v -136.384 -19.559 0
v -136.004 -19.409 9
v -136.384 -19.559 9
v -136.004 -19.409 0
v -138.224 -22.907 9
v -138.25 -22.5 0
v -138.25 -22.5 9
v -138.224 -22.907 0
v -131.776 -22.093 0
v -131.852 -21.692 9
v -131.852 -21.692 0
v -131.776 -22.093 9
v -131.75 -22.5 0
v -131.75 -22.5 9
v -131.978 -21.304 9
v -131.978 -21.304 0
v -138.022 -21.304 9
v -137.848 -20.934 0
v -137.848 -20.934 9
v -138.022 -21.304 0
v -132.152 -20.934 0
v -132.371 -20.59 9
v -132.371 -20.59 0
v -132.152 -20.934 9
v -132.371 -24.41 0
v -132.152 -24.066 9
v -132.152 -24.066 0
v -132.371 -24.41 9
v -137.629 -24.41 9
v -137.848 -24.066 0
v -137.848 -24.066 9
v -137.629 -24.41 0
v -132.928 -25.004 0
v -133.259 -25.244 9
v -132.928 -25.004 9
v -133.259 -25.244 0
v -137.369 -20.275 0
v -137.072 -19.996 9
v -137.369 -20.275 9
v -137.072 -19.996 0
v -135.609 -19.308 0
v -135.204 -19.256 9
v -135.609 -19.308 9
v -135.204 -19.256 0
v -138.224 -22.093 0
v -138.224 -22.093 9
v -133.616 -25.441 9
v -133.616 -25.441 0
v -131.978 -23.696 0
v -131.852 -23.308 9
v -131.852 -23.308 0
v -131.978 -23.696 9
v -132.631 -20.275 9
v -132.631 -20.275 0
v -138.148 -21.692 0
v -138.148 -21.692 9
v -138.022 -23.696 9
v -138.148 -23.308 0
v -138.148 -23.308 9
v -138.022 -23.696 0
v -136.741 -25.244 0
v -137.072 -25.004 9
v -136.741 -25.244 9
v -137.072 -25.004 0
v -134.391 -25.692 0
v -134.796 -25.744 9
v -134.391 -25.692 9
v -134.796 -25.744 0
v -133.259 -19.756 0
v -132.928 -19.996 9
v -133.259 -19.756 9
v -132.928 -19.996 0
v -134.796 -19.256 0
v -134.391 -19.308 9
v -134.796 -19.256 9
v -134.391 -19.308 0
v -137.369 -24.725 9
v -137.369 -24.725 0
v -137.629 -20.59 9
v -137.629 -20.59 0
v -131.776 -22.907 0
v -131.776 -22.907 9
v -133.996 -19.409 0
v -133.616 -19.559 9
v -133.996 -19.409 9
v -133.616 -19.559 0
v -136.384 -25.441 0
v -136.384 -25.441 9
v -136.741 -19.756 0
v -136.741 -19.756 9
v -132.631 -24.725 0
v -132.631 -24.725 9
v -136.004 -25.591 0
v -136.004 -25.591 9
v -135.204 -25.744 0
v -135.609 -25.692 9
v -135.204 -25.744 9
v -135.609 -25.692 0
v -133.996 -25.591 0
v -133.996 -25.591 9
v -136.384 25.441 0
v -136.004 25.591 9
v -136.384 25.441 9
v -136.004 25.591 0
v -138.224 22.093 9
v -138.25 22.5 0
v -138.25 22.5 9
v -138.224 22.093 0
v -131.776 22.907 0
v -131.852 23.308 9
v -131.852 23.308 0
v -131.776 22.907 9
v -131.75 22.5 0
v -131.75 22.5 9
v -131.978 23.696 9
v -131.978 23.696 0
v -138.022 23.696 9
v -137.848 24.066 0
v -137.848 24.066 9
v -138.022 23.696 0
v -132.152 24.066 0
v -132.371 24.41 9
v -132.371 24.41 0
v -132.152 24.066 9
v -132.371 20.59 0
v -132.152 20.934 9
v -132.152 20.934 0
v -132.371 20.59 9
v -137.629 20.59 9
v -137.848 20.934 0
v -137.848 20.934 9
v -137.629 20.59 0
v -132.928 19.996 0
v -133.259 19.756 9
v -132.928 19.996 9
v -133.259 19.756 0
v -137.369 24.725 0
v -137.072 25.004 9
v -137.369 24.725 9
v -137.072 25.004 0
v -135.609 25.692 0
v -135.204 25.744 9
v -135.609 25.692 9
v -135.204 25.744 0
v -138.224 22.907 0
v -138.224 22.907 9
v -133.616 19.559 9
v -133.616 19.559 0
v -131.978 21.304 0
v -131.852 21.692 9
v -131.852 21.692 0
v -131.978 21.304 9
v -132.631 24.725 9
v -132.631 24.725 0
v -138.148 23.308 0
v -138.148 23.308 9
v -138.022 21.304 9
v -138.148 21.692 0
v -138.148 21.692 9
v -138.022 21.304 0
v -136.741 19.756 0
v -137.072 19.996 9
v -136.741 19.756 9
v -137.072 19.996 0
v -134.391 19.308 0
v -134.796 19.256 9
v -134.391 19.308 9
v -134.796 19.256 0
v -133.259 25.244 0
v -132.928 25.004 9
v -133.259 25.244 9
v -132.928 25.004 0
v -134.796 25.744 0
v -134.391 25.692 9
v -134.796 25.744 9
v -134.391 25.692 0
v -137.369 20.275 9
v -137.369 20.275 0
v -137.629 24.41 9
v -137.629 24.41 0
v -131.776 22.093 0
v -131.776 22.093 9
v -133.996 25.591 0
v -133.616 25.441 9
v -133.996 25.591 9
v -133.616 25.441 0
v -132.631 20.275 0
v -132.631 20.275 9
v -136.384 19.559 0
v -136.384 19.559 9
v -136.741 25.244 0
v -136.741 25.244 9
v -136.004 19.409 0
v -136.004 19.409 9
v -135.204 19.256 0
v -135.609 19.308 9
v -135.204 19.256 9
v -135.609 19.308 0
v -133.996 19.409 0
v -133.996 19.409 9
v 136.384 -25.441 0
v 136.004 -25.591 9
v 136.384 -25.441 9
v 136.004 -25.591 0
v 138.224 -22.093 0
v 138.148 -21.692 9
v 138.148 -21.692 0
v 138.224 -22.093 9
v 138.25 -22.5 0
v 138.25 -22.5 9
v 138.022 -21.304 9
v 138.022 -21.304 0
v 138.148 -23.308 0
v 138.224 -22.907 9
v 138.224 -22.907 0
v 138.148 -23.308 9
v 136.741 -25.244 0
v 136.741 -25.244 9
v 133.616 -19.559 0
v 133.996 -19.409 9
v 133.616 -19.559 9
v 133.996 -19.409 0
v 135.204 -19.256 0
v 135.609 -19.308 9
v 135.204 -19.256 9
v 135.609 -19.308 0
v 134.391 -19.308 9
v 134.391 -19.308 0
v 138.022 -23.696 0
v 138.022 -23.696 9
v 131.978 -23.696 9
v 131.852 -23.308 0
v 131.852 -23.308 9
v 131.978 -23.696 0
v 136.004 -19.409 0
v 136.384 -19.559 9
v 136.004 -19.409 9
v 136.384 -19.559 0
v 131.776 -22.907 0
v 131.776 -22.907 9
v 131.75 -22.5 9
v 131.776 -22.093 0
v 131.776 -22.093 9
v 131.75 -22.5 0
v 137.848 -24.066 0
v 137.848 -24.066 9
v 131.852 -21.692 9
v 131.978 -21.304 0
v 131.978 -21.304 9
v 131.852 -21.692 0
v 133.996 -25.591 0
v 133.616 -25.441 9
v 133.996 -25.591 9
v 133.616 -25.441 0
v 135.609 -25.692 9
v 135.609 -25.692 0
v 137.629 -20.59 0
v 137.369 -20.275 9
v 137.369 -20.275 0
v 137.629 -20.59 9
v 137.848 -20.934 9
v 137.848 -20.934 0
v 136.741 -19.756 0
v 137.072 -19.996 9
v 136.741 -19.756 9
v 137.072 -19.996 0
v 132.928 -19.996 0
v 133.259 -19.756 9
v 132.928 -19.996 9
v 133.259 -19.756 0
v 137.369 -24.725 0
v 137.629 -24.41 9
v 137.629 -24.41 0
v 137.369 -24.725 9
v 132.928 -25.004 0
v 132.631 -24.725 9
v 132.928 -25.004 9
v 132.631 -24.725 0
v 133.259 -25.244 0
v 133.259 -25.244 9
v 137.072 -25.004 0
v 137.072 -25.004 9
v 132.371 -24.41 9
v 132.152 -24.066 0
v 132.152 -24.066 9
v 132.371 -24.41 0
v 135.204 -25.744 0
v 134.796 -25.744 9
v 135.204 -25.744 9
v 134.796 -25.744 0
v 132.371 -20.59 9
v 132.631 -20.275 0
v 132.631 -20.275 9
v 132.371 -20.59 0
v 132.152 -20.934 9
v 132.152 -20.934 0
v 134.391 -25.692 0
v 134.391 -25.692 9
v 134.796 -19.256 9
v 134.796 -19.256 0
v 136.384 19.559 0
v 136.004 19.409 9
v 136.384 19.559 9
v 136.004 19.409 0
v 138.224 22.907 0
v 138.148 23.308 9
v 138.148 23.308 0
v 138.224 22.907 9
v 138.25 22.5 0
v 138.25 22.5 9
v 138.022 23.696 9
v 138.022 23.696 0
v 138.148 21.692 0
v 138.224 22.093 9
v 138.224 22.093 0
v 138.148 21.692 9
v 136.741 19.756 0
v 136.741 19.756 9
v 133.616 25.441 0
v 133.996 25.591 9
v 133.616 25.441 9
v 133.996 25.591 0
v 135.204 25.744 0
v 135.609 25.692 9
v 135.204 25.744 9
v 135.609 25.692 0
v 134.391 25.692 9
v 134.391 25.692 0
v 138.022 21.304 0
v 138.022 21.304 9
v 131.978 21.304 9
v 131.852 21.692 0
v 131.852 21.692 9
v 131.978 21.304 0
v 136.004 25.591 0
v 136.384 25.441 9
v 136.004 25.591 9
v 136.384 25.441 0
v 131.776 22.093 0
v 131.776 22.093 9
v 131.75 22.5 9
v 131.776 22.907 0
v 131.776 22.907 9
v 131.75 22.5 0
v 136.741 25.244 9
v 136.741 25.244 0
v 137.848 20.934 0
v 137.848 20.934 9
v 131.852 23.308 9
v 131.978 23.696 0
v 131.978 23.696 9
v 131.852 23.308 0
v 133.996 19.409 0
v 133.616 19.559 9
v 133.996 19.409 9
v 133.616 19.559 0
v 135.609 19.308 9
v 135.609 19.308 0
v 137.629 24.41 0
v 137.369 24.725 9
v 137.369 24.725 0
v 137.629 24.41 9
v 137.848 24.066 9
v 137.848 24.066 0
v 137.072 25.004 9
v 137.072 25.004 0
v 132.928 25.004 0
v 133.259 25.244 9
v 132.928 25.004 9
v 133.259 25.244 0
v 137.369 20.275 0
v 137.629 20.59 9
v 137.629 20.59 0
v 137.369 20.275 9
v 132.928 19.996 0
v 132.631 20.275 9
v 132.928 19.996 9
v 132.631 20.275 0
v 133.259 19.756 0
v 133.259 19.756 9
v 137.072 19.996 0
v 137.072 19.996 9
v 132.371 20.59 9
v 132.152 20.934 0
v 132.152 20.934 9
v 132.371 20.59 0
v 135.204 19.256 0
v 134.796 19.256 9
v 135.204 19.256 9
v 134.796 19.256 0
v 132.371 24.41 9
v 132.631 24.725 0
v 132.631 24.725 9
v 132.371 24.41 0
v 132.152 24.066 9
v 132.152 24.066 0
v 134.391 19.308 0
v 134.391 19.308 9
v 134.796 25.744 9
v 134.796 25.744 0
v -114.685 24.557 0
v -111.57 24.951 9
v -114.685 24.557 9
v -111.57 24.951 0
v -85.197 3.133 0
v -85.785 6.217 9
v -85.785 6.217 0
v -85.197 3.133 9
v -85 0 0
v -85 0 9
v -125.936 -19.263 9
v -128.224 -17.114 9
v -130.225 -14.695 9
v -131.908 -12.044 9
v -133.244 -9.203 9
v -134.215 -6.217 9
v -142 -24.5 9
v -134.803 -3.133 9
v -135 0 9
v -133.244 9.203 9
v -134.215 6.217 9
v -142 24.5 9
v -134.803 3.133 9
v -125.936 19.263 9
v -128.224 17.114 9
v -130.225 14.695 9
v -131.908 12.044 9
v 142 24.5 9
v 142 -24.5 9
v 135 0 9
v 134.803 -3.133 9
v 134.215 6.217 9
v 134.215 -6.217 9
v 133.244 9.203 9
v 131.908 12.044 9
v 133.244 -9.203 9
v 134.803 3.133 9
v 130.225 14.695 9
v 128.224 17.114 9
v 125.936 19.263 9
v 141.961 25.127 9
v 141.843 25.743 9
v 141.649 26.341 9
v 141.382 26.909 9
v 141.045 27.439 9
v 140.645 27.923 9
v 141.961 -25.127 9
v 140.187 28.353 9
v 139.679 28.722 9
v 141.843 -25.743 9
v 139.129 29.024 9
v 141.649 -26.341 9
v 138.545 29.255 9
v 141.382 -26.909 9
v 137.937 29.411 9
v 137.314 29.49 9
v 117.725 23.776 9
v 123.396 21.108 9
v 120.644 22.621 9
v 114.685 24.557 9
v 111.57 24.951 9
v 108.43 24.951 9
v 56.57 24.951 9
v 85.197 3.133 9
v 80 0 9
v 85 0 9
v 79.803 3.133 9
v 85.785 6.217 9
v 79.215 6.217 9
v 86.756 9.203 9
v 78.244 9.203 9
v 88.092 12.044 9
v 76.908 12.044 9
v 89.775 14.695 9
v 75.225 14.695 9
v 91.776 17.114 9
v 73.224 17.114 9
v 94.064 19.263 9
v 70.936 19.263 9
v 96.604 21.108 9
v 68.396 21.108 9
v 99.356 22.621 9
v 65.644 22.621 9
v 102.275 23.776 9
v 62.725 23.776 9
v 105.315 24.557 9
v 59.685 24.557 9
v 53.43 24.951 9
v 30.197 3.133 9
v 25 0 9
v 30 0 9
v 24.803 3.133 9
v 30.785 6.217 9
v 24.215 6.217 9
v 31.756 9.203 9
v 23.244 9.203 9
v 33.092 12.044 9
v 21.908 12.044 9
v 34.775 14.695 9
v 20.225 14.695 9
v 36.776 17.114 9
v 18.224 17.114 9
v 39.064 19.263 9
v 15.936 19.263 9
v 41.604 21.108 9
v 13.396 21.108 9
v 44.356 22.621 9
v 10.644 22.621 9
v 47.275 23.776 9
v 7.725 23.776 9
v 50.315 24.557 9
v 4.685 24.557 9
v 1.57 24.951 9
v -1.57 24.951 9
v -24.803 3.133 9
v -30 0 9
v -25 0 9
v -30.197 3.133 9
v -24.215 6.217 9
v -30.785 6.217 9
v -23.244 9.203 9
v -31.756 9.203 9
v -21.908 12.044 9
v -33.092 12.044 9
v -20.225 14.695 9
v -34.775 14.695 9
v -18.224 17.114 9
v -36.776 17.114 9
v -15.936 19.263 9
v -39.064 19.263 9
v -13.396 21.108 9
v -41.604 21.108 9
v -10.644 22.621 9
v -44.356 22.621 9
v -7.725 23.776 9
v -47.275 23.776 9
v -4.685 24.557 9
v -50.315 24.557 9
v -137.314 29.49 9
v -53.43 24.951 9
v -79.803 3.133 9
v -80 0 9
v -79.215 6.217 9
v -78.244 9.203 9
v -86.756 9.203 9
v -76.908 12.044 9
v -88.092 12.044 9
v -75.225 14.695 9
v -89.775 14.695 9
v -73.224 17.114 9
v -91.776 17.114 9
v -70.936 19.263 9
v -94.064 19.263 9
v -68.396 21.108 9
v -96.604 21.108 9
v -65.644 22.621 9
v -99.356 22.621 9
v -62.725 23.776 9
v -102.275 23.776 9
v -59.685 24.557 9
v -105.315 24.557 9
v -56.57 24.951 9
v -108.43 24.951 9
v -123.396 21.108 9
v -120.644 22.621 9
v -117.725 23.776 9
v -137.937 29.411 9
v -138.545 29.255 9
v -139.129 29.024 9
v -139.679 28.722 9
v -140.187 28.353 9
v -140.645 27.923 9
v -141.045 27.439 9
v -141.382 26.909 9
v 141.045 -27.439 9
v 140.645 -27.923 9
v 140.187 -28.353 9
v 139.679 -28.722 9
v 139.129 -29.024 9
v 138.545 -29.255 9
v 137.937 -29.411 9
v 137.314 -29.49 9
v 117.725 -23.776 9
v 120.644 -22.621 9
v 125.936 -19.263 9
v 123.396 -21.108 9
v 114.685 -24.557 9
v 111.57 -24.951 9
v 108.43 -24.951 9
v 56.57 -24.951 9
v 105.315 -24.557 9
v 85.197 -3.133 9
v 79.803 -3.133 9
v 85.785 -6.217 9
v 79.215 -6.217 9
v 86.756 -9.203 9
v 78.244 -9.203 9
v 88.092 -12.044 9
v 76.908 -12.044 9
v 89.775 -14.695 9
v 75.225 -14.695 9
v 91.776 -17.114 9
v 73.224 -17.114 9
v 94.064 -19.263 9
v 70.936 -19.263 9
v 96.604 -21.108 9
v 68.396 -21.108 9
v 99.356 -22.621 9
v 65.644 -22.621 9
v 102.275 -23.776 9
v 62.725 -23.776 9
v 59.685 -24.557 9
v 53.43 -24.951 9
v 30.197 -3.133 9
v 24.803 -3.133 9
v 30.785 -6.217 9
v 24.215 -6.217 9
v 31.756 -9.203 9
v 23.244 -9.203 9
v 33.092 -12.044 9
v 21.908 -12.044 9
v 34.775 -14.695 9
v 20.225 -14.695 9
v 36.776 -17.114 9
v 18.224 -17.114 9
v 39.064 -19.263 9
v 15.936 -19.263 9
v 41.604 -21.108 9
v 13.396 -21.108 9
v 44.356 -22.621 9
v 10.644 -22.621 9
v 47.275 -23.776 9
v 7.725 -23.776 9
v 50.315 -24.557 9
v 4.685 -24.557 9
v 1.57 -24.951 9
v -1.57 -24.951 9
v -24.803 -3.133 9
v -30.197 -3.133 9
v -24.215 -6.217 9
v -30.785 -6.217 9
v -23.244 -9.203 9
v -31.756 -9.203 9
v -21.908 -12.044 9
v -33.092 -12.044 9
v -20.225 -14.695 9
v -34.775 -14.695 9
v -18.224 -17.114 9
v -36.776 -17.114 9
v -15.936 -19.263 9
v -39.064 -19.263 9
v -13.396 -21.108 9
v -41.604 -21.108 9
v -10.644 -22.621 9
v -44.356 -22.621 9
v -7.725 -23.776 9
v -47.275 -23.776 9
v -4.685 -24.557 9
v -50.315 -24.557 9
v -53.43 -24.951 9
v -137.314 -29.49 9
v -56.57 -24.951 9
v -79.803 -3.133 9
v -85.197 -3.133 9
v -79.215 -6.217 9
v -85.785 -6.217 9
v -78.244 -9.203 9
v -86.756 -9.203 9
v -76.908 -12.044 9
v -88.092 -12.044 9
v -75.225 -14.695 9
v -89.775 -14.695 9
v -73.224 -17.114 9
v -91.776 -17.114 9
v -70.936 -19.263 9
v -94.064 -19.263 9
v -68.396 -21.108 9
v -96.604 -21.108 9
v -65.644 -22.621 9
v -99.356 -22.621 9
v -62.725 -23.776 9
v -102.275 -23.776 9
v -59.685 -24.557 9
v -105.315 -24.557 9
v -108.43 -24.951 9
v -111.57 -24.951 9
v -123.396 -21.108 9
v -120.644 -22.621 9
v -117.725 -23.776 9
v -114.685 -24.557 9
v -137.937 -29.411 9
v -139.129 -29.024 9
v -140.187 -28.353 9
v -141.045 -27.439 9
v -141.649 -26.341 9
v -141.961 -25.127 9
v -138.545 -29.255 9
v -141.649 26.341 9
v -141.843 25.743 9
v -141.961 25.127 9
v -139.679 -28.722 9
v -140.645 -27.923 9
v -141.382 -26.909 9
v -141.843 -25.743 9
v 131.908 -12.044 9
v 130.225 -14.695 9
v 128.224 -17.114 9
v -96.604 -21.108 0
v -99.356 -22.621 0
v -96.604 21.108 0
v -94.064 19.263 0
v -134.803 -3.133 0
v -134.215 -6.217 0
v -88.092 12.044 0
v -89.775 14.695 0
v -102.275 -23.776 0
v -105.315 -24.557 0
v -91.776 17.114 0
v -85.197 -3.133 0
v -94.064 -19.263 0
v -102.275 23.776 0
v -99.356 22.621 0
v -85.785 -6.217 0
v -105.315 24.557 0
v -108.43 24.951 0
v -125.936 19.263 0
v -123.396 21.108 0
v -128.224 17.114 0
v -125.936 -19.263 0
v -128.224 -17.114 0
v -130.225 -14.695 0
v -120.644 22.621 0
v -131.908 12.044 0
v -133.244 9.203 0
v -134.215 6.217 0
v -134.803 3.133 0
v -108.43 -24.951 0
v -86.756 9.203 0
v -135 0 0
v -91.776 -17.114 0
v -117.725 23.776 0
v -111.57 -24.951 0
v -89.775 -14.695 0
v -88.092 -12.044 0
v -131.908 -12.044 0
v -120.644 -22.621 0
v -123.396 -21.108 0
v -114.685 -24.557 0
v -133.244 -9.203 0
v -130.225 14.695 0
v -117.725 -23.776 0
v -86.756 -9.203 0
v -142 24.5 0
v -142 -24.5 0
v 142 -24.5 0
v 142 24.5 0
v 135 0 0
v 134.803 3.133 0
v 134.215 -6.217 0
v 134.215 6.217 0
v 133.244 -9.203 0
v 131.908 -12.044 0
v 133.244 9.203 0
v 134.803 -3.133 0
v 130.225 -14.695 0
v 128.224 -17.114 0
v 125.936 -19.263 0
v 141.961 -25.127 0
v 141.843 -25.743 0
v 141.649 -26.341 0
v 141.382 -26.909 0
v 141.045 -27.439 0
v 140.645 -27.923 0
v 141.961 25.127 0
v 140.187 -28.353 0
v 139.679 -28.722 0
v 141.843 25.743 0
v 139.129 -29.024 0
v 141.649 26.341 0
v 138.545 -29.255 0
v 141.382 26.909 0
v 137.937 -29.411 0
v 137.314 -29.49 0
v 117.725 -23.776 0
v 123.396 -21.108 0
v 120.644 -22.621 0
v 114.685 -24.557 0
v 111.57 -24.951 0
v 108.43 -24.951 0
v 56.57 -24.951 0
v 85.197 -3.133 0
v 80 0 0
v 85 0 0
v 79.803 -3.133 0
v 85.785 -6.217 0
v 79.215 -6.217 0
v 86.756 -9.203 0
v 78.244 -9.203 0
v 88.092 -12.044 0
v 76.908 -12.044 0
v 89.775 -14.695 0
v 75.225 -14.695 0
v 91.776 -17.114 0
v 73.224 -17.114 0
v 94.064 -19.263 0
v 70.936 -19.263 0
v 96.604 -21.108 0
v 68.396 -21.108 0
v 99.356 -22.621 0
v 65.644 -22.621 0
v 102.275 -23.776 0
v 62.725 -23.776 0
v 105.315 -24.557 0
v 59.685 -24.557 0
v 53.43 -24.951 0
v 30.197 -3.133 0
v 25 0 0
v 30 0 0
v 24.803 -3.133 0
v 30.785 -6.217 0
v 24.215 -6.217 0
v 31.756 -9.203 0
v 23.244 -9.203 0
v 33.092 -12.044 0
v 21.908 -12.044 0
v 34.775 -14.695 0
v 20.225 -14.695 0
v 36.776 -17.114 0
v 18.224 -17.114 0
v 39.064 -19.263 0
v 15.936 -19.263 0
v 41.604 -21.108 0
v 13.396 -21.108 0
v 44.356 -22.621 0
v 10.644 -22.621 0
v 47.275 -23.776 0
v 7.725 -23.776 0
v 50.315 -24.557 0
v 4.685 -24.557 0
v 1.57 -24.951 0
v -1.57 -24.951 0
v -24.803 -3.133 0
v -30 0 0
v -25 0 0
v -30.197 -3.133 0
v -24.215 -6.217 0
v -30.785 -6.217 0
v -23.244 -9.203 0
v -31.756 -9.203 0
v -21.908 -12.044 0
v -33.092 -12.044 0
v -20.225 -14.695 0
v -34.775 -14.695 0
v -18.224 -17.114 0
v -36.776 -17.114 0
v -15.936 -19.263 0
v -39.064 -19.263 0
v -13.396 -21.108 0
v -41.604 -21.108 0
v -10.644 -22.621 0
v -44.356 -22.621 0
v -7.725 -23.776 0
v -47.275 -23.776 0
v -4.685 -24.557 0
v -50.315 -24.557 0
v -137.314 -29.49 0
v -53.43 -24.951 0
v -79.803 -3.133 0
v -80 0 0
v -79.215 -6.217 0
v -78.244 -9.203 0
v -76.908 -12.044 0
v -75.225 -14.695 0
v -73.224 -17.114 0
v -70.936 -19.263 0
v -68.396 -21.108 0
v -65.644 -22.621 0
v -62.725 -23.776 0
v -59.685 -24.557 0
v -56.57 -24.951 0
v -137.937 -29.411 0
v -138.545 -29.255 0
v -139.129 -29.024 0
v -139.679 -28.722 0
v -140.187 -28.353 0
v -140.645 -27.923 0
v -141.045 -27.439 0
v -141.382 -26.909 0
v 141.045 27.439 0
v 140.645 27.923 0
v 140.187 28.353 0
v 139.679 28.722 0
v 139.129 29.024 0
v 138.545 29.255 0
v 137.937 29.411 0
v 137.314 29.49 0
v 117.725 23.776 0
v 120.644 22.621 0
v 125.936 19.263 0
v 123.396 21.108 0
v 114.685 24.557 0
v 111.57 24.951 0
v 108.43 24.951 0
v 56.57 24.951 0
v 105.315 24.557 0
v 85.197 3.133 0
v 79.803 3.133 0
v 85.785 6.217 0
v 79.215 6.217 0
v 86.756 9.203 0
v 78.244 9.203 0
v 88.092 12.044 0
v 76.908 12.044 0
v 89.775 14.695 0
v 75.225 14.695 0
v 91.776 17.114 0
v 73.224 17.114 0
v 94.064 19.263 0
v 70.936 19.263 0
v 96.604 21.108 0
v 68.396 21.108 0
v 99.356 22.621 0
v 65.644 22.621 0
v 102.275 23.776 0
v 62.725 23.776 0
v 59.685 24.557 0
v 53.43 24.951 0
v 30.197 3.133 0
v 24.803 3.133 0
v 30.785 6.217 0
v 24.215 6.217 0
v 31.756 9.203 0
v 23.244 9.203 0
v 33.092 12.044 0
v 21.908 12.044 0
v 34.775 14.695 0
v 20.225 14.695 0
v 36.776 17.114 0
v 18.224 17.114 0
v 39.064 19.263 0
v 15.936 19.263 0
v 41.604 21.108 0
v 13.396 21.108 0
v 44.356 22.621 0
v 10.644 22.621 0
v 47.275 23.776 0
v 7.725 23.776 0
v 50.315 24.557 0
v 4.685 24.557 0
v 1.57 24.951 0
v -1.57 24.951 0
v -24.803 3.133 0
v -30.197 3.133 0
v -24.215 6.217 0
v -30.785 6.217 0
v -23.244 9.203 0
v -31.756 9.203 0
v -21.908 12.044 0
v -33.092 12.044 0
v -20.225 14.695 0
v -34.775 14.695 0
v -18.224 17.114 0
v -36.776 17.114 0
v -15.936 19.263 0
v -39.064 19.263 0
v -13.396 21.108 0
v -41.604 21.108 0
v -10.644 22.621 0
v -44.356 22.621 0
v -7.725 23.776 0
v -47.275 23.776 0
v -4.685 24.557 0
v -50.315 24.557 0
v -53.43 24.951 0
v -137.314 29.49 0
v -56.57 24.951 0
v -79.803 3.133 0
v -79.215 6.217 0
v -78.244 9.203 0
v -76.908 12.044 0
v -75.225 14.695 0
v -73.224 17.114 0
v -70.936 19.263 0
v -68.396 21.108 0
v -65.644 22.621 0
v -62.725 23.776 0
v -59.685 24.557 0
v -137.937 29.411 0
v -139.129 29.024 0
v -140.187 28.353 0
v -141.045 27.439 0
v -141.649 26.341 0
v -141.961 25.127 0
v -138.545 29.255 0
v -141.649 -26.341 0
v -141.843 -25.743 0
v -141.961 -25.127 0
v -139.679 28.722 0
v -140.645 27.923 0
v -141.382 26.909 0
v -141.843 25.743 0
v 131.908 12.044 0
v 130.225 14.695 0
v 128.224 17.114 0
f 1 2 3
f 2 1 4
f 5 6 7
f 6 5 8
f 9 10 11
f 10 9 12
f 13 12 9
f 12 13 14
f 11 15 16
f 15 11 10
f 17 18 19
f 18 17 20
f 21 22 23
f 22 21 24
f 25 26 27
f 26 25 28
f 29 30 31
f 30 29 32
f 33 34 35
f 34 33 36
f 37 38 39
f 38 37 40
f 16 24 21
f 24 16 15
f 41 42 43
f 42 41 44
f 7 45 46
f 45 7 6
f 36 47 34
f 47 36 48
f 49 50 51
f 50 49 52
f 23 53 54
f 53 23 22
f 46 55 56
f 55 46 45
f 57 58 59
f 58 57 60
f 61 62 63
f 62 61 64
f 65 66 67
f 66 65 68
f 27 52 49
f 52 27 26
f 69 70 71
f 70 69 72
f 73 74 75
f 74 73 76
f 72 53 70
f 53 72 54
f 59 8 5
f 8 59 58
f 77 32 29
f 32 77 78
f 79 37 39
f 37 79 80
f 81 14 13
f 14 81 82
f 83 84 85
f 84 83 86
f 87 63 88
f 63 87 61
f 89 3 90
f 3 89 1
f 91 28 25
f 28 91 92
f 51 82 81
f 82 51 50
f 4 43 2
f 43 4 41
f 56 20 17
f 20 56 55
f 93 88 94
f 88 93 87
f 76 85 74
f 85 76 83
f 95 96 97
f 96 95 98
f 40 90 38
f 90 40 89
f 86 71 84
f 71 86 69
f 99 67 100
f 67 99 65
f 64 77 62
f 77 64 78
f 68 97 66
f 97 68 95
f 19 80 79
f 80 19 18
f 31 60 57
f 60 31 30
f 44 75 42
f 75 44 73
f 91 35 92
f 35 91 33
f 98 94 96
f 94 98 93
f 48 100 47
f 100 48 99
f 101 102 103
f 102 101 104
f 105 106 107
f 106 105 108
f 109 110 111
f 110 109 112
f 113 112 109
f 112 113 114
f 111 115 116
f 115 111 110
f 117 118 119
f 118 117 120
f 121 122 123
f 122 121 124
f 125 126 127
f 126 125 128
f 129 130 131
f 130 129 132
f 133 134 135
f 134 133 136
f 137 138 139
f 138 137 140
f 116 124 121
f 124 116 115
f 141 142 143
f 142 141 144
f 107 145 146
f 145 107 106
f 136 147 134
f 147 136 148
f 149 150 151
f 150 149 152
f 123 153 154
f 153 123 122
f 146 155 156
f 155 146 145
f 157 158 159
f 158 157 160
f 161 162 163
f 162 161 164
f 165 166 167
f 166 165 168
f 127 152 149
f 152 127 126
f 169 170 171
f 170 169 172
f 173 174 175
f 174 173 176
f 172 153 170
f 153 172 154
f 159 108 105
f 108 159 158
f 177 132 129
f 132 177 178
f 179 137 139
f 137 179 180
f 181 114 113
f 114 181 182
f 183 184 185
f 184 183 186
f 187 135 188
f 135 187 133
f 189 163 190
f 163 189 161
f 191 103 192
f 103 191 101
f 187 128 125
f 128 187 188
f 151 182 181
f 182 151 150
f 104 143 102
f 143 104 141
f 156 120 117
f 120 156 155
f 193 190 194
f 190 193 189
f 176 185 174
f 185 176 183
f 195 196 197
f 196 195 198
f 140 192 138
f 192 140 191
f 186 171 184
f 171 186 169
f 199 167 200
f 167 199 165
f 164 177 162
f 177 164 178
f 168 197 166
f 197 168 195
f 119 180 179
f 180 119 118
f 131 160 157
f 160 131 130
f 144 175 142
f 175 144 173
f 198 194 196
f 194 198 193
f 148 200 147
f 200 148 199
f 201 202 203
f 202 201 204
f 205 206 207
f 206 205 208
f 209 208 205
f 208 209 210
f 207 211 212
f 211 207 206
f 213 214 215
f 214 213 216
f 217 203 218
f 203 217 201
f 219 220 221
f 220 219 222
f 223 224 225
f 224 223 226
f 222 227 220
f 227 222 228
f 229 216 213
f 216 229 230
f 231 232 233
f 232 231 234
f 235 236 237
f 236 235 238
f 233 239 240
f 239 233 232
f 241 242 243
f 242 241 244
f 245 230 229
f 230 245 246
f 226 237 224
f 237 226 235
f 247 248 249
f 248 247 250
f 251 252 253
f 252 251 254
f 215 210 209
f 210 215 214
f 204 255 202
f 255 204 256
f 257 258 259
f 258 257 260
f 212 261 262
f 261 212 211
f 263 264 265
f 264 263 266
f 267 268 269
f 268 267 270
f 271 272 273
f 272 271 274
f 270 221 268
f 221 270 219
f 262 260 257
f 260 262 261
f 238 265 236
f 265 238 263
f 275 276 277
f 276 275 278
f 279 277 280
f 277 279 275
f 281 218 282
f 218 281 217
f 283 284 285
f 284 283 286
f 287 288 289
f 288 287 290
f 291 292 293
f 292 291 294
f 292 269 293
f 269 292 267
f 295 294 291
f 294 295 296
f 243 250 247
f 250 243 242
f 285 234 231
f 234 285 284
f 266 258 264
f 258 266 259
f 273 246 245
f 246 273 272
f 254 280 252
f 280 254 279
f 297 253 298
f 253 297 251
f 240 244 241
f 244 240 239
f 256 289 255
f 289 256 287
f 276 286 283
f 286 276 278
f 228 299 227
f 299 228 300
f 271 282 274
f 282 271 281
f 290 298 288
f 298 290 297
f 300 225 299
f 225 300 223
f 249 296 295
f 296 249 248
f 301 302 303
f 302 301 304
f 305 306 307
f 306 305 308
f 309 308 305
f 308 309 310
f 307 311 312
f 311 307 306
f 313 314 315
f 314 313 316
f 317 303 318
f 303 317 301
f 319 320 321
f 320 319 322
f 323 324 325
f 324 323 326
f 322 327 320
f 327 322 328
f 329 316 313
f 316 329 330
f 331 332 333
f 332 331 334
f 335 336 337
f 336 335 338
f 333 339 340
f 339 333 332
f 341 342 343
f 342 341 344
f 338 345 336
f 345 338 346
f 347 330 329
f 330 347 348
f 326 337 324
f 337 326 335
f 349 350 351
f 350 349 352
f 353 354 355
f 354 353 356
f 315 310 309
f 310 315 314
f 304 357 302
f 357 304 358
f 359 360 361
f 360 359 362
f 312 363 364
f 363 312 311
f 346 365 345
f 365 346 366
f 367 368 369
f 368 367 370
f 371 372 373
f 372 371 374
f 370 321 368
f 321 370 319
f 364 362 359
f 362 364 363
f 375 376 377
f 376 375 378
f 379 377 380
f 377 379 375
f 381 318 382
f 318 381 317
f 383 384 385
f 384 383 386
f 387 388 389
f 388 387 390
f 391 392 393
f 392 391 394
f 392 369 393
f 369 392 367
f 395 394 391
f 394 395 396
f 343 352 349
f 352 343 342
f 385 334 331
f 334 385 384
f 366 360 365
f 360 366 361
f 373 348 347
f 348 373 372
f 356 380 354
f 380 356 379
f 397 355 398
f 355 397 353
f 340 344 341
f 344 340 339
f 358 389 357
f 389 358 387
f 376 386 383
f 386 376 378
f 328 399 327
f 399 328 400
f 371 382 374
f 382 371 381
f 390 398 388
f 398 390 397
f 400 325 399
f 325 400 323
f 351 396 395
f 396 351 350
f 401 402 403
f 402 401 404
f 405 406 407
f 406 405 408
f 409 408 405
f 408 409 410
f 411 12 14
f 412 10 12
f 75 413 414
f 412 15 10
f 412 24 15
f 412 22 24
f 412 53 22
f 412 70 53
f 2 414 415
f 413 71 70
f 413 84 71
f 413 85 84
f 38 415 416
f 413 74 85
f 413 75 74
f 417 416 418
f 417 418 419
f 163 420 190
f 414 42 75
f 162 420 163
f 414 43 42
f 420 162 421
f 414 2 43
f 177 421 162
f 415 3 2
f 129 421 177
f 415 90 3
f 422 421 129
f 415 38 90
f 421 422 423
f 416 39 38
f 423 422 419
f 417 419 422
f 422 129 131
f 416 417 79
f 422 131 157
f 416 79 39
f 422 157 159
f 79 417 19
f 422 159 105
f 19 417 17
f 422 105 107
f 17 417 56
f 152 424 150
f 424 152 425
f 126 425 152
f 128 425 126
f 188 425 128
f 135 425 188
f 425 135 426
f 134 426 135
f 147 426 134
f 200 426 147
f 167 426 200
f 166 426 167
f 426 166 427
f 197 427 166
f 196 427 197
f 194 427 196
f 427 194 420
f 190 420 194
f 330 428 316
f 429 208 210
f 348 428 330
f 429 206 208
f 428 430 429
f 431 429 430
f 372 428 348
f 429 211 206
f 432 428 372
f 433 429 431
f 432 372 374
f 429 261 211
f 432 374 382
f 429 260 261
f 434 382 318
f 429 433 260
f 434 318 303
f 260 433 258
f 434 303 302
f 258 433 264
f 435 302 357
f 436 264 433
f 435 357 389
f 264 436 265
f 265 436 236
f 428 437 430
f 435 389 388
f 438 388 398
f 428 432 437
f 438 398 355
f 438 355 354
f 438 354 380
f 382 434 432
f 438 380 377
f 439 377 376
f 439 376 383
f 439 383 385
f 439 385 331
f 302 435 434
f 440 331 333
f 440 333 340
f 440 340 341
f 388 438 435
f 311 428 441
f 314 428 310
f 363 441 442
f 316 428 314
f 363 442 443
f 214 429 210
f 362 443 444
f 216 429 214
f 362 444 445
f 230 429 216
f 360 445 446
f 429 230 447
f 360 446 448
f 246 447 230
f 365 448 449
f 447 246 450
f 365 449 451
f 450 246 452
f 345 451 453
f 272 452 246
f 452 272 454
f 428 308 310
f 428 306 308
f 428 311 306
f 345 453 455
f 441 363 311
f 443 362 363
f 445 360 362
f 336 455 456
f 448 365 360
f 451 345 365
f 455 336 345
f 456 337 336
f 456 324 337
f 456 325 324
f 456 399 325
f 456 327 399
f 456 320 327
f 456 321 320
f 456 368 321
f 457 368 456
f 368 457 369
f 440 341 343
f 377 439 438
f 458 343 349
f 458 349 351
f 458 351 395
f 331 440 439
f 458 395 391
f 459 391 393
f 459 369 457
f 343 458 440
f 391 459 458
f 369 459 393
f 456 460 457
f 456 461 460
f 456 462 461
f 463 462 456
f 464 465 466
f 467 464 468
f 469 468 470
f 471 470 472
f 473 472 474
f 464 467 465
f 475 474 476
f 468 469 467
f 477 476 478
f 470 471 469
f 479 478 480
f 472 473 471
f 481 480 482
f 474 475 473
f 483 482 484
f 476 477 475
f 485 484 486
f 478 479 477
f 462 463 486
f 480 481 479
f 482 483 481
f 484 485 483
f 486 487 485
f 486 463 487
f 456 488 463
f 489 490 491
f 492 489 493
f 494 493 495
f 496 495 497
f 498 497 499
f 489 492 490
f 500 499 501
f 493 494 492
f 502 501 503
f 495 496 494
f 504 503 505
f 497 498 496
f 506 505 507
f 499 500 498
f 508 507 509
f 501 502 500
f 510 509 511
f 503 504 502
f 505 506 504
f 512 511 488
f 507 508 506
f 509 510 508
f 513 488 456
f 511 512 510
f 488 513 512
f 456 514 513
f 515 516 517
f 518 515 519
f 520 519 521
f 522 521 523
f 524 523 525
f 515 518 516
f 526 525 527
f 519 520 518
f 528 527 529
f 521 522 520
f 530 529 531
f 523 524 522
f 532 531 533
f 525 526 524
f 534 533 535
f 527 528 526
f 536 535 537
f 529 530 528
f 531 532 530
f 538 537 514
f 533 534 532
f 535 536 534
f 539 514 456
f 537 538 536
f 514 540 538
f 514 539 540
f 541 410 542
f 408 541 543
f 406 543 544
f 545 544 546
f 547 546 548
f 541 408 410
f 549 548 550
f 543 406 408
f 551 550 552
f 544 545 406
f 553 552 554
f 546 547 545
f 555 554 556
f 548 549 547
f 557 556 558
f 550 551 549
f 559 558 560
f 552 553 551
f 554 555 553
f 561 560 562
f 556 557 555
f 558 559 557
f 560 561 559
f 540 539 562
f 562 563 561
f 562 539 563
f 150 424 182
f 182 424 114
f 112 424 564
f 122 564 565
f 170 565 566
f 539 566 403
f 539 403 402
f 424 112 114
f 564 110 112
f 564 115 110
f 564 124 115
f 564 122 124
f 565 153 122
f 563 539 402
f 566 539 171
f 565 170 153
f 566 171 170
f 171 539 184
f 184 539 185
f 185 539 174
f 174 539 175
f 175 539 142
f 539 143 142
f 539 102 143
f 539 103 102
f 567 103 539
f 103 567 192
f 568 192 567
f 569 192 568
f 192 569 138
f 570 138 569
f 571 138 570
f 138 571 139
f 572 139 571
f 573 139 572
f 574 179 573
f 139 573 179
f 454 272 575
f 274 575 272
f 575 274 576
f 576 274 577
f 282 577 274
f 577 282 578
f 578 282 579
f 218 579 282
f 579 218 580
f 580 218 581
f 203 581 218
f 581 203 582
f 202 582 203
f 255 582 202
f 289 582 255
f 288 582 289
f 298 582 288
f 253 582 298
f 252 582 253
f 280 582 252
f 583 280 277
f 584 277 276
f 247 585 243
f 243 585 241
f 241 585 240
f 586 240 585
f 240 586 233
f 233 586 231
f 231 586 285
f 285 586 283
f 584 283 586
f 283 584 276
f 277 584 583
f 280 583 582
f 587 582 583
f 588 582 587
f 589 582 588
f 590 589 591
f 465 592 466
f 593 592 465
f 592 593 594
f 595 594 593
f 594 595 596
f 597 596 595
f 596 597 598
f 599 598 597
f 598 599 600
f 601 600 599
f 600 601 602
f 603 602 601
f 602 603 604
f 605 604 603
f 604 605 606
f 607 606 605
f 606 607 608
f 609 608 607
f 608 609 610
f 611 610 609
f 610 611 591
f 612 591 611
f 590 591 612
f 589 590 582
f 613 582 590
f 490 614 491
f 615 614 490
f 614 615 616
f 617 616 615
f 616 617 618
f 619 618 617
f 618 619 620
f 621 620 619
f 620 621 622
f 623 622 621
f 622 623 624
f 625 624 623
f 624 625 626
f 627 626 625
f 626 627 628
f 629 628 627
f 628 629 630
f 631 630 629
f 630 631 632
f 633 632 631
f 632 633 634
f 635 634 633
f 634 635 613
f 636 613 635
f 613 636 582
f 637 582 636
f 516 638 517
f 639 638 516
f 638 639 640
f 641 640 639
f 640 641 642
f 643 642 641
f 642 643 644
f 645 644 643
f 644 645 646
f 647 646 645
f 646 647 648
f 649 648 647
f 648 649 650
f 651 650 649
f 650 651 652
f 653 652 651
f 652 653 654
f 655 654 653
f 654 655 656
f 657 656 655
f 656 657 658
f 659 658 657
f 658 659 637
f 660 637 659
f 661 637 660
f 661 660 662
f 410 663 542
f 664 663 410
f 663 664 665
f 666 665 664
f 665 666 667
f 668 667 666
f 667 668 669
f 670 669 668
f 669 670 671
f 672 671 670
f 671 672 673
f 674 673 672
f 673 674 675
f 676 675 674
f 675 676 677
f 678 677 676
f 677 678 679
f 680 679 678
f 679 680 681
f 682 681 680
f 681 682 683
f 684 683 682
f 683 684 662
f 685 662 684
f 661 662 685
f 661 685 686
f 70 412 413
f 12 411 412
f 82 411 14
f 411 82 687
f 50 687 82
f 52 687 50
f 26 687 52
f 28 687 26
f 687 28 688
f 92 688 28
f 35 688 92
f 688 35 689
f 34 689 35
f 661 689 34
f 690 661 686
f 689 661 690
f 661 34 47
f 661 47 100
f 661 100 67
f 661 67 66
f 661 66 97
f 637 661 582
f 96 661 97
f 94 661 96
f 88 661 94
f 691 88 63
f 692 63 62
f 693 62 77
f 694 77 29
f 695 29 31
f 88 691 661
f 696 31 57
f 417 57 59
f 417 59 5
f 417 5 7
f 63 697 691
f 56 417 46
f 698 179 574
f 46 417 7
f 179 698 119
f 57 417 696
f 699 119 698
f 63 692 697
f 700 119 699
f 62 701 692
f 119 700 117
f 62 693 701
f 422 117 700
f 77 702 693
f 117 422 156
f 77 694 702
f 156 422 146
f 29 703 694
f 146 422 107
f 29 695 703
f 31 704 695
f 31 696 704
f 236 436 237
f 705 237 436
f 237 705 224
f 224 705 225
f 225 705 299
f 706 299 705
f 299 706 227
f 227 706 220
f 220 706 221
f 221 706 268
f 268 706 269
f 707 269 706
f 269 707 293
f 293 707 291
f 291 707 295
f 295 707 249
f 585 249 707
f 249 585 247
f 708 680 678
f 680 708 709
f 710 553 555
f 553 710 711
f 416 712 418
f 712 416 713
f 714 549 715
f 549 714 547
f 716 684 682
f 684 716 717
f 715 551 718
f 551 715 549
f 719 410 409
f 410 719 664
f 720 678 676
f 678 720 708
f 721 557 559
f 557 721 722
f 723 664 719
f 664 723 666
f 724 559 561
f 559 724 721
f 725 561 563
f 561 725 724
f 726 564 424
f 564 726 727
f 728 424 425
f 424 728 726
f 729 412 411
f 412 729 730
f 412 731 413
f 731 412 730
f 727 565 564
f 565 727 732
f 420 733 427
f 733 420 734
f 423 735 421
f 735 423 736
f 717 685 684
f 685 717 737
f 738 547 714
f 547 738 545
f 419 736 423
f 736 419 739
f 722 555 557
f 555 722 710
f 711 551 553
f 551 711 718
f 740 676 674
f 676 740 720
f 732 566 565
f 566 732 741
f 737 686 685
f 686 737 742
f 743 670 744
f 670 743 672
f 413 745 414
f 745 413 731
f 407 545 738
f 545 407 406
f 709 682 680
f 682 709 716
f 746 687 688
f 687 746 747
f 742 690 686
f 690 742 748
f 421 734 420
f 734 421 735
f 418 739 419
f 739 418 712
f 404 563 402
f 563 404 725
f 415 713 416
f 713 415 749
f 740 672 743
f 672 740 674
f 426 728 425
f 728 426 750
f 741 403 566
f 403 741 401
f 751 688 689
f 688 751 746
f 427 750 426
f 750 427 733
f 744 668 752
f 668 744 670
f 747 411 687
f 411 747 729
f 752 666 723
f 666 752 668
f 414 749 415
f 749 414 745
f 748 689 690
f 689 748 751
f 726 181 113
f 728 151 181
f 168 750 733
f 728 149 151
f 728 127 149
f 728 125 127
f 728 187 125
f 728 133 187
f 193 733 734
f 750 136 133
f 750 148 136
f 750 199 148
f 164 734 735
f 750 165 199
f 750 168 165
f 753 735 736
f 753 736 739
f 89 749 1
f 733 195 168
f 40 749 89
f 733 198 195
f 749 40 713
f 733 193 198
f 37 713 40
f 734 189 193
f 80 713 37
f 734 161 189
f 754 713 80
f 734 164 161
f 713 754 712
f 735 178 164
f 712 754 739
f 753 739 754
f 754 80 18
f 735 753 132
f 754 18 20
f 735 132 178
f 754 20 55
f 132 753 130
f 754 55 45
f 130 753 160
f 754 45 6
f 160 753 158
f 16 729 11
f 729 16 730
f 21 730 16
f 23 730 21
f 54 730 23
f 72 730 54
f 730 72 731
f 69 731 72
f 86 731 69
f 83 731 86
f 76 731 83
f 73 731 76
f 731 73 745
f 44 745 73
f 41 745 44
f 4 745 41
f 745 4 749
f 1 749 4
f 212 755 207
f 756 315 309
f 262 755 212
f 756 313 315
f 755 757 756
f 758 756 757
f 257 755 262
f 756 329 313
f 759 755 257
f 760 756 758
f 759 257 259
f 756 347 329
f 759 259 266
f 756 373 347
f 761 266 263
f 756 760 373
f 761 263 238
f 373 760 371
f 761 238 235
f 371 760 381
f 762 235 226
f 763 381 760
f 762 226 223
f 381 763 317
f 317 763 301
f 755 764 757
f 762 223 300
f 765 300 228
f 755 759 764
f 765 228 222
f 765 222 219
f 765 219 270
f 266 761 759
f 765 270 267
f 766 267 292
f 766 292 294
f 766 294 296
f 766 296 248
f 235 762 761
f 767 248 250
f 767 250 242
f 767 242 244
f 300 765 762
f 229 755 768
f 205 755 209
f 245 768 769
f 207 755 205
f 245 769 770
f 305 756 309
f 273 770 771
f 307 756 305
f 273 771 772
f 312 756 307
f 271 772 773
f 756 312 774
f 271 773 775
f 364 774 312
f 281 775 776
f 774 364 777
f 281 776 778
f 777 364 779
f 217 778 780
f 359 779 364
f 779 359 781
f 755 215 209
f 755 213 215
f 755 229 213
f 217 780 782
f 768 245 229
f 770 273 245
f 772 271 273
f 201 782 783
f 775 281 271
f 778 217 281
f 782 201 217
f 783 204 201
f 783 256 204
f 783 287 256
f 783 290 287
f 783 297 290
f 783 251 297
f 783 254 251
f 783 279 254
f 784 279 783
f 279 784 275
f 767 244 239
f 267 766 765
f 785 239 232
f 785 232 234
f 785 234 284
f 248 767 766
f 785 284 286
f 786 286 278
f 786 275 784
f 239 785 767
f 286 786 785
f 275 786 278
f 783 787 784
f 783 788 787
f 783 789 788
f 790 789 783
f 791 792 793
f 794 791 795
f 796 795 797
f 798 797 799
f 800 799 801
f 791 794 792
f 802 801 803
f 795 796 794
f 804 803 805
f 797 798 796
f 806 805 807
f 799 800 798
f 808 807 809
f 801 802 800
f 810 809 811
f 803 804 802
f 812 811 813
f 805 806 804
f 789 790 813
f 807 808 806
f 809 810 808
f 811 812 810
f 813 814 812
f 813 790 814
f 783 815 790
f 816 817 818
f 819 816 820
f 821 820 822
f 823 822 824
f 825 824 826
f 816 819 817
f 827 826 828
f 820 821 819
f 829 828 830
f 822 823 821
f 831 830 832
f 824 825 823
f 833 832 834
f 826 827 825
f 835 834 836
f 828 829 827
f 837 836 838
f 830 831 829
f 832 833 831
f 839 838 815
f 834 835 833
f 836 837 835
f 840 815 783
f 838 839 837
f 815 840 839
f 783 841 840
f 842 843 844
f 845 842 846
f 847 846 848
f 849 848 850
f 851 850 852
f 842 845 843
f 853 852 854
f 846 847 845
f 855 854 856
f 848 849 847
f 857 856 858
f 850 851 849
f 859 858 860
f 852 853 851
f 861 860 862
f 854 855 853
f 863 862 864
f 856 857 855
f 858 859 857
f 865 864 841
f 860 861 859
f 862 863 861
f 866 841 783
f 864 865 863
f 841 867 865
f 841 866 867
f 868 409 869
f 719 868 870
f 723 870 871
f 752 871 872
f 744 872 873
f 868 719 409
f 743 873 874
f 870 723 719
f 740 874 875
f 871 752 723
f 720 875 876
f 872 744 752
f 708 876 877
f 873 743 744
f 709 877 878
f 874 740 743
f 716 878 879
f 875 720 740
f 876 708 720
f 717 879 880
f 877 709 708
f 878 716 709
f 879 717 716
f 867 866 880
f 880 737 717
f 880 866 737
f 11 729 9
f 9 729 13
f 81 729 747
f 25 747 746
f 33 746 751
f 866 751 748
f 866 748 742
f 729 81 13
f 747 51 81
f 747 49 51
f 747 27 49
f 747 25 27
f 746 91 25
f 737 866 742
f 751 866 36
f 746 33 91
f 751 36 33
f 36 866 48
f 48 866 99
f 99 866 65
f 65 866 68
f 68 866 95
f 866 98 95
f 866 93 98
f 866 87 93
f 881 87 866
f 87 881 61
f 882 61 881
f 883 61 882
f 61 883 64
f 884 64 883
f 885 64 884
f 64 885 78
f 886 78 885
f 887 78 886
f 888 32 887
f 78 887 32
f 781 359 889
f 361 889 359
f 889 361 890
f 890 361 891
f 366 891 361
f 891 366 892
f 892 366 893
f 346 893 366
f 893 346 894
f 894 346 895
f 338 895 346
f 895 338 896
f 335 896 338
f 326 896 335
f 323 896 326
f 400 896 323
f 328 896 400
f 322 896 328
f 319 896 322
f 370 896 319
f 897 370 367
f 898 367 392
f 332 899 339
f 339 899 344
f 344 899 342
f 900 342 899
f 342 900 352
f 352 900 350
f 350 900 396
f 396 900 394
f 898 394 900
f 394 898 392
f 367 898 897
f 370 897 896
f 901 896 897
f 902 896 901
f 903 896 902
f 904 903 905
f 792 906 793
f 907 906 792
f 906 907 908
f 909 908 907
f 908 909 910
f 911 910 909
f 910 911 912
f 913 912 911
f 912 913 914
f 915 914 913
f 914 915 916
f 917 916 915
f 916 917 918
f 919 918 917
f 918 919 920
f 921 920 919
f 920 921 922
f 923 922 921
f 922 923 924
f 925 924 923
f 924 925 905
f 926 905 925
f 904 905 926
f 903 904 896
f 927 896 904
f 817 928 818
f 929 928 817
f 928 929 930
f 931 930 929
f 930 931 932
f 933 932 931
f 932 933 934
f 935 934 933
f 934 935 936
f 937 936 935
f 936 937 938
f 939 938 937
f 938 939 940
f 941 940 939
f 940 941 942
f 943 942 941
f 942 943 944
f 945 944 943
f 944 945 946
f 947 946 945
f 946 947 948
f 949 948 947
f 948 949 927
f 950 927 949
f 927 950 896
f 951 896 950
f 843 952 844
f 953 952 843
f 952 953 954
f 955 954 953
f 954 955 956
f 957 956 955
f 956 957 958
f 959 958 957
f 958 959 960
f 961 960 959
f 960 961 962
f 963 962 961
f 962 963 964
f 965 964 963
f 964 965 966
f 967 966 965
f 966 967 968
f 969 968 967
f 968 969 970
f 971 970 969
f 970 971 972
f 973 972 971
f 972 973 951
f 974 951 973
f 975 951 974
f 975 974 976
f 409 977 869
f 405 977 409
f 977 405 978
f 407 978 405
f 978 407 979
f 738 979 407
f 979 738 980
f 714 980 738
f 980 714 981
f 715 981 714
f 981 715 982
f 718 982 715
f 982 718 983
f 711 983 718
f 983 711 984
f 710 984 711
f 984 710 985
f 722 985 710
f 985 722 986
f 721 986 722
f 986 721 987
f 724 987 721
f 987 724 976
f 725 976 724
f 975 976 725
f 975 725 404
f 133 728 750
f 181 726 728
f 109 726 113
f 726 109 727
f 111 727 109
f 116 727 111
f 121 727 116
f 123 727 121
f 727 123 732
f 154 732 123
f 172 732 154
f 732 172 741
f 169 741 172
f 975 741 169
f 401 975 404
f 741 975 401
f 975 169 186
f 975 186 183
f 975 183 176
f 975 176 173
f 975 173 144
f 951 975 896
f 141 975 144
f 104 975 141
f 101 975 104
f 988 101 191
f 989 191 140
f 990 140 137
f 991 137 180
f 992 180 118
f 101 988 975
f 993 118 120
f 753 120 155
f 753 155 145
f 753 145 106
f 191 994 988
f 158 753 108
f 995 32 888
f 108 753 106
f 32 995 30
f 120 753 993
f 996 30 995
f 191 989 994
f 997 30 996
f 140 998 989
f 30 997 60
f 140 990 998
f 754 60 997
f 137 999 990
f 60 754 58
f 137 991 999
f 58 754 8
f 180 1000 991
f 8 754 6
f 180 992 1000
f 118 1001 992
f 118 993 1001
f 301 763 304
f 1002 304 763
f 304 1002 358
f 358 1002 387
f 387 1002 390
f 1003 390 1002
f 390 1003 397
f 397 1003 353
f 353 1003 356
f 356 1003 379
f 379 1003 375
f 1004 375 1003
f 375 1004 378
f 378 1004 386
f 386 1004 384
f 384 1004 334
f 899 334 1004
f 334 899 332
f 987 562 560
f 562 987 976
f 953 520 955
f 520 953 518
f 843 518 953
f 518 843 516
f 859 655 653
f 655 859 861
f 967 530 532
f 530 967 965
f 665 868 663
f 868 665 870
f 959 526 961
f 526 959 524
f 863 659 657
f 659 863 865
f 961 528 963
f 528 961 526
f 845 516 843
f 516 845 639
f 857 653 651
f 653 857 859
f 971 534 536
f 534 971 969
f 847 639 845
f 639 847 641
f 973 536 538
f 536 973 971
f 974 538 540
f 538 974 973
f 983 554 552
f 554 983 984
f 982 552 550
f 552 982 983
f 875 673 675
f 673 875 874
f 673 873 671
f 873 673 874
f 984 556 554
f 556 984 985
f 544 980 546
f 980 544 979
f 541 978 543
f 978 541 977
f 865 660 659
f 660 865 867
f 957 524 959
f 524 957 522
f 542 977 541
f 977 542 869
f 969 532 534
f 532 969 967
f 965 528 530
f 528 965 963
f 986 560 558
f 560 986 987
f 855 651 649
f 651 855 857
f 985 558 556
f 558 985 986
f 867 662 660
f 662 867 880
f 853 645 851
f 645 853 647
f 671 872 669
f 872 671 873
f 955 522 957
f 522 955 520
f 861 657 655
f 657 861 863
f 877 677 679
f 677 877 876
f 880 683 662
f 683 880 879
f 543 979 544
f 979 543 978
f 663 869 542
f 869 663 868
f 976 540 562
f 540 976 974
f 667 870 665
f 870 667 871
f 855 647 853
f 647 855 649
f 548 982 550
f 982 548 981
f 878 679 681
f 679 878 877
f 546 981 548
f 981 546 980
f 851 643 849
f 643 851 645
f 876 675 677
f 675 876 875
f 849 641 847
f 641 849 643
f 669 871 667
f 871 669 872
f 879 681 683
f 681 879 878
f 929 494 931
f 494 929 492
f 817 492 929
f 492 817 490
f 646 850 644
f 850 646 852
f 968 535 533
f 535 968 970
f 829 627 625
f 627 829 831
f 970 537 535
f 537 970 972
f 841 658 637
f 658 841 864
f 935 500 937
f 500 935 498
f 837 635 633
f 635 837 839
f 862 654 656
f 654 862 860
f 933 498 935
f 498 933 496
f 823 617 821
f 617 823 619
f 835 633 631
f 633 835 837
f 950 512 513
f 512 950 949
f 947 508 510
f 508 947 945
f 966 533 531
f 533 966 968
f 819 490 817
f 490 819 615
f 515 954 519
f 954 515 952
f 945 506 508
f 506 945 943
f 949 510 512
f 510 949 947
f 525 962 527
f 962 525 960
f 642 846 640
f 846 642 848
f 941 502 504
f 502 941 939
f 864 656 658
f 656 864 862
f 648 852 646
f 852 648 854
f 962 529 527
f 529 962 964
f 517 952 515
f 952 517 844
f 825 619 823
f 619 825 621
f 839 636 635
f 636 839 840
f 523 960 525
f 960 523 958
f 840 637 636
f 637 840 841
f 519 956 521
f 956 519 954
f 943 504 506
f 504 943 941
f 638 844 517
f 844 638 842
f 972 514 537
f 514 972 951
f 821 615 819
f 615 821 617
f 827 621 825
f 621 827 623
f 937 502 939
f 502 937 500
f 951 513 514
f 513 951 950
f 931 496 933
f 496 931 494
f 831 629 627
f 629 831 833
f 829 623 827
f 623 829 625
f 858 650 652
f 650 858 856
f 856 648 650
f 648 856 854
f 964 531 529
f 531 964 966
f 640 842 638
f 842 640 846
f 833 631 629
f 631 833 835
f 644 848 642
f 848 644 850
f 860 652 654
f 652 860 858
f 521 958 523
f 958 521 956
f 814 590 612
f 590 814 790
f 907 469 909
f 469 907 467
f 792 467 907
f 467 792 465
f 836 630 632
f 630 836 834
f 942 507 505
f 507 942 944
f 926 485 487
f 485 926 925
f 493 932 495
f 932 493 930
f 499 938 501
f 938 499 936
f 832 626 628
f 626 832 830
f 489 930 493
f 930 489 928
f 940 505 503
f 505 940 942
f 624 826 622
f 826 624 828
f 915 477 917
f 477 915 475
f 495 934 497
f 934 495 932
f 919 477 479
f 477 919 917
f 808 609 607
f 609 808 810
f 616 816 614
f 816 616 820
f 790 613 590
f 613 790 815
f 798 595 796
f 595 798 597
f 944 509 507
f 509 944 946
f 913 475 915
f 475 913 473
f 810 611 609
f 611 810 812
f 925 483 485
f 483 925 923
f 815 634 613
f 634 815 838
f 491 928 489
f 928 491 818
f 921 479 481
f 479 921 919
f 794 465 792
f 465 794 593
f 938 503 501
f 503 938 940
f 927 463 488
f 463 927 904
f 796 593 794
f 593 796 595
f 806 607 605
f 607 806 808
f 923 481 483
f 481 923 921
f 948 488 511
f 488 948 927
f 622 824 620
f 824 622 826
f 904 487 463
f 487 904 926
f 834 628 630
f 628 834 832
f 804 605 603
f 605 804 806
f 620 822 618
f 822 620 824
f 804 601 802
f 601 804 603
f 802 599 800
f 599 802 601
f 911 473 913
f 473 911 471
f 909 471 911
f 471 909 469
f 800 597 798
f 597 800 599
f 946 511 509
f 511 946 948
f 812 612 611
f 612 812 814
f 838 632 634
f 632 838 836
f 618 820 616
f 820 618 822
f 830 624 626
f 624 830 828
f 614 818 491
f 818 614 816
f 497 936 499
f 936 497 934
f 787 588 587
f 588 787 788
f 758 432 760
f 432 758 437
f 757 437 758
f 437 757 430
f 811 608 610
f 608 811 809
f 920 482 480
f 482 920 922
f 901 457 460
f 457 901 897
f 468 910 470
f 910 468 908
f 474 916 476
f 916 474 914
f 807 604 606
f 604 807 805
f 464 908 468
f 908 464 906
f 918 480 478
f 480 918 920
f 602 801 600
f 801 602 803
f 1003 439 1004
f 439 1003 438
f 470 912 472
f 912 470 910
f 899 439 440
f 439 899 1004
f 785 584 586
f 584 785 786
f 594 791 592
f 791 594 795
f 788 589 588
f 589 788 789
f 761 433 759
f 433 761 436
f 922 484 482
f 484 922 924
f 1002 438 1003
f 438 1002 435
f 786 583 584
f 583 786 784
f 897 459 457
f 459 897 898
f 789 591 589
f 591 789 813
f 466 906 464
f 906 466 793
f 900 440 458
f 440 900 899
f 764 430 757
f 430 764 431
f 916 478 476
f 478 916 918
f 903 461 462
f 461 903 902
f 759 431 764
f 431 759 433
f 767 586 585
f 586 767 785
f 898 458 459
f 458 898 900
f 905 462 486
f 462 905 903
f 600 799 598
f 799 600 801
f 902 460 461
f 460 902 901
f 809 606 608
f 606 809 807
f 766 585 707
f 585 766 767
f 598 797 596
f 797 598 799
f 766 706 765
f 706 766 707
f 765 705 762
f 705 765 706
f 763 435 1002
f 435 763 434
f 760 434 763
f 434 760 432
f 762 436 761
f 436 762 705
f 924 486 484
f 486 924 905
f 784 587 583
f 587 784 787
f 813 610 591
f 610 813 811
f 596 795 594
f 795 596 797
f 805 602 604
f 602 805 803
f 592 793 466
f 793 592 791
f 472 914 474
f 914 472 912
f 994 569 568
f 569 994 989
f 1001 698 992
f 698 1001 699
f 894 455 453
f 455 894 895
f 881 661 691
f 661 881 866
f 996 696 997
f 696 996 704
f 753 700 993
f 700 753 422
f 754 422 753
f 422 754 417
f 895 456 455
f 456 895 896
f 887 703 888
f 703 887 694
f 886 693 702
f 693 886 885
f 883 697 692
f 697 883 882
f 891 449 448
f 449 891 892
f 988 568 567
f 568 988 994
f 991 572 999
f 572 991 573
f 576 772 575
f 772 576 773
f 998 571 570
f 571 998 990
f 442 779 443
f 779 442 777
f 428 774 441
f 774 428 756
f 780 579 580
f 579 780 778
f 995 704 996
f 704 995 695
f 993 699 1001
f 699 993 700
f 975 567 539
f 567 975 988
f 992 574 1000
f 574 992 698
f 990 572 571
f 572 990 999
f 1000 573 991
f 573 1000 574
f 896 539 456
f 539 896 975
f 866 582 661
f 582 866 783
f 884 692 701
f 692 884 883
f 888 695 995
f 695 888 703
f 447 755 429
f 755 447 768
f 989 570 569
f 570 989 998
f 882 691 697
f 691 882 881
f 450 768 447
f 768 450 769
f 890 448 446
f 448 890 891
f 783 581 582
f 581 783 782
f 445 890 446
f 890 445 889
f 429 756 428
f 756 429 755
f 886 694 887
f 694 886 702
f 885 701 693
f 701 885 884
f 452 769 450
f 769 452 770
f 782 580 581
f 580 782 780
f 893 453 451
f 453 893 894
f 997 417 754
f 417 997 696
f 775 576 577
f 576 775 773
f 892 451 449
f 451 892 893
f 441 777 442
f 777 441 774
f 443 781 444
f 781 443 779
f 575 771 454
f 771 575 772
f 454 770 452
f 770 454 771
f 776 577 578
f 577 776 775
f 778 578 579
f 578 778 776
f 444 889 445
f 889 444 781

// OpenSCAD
$fn = 50;


difference() {
	union() {
		hull() {
			translate(v = [-137.0000000000, 24.5000000000, 0]) {
				cylinder(h = 9, r = 5);
			}
			translate(v = [137.0000000000, 24.5000000000, 0]) {
				cylinder(h = 9, r = 5);
			}
			translate(v = [-137.0000000000, -24.5000000000, 0]) {
				cylinder(h = 9, r = 5);
			}
			translate(v = [137.0000000000, -24.5000000000, 0]) {
				cylinder(h = 9, r = 5);
			}
		}
	}
	union() {
		#translate(v = [-135.0000000000, -22.5000000000, -100.0000000000]) {
			cylinder(h = 200, r = 3.2500000000);
		}
		#translate(v = [-135.0000000000, 22.5000000000, -100.0000000000]) {
			cylinder(h = 200, r = 3.2500000000);
		}
		#translate(v = [135.0000000000, -22.5000000000, -100.0000000000]) {
			cylinder(h = 200, r = 3.2500000000);
		}
		#translate(v = [135.0000000000, 22.5000000000, -100.0000000000]) {
			cylinder(h = 200, r = 3.2500000000);
		}
		#translate(v = [-110.0000000000, 0, 0]) {
			cylinder(h = 9, r = 25.0000000000);
		}
		#translate(v = [-55.0000000000, 0, 0]) {
			cylinder(h = 9, r = 25.0000000000);
		}
		#cylinder(h = 9, r = 25.0000000000);
		#translate(v = [55.0000000000, 0, 0]) {
			cylinder(h = 9, r = 25.0000000000);
		}
		#translate(v = [110.0000000000, 0, 0]) {
			cylinder(h = 9, r = 25.0000000000);
		}
	}
}
